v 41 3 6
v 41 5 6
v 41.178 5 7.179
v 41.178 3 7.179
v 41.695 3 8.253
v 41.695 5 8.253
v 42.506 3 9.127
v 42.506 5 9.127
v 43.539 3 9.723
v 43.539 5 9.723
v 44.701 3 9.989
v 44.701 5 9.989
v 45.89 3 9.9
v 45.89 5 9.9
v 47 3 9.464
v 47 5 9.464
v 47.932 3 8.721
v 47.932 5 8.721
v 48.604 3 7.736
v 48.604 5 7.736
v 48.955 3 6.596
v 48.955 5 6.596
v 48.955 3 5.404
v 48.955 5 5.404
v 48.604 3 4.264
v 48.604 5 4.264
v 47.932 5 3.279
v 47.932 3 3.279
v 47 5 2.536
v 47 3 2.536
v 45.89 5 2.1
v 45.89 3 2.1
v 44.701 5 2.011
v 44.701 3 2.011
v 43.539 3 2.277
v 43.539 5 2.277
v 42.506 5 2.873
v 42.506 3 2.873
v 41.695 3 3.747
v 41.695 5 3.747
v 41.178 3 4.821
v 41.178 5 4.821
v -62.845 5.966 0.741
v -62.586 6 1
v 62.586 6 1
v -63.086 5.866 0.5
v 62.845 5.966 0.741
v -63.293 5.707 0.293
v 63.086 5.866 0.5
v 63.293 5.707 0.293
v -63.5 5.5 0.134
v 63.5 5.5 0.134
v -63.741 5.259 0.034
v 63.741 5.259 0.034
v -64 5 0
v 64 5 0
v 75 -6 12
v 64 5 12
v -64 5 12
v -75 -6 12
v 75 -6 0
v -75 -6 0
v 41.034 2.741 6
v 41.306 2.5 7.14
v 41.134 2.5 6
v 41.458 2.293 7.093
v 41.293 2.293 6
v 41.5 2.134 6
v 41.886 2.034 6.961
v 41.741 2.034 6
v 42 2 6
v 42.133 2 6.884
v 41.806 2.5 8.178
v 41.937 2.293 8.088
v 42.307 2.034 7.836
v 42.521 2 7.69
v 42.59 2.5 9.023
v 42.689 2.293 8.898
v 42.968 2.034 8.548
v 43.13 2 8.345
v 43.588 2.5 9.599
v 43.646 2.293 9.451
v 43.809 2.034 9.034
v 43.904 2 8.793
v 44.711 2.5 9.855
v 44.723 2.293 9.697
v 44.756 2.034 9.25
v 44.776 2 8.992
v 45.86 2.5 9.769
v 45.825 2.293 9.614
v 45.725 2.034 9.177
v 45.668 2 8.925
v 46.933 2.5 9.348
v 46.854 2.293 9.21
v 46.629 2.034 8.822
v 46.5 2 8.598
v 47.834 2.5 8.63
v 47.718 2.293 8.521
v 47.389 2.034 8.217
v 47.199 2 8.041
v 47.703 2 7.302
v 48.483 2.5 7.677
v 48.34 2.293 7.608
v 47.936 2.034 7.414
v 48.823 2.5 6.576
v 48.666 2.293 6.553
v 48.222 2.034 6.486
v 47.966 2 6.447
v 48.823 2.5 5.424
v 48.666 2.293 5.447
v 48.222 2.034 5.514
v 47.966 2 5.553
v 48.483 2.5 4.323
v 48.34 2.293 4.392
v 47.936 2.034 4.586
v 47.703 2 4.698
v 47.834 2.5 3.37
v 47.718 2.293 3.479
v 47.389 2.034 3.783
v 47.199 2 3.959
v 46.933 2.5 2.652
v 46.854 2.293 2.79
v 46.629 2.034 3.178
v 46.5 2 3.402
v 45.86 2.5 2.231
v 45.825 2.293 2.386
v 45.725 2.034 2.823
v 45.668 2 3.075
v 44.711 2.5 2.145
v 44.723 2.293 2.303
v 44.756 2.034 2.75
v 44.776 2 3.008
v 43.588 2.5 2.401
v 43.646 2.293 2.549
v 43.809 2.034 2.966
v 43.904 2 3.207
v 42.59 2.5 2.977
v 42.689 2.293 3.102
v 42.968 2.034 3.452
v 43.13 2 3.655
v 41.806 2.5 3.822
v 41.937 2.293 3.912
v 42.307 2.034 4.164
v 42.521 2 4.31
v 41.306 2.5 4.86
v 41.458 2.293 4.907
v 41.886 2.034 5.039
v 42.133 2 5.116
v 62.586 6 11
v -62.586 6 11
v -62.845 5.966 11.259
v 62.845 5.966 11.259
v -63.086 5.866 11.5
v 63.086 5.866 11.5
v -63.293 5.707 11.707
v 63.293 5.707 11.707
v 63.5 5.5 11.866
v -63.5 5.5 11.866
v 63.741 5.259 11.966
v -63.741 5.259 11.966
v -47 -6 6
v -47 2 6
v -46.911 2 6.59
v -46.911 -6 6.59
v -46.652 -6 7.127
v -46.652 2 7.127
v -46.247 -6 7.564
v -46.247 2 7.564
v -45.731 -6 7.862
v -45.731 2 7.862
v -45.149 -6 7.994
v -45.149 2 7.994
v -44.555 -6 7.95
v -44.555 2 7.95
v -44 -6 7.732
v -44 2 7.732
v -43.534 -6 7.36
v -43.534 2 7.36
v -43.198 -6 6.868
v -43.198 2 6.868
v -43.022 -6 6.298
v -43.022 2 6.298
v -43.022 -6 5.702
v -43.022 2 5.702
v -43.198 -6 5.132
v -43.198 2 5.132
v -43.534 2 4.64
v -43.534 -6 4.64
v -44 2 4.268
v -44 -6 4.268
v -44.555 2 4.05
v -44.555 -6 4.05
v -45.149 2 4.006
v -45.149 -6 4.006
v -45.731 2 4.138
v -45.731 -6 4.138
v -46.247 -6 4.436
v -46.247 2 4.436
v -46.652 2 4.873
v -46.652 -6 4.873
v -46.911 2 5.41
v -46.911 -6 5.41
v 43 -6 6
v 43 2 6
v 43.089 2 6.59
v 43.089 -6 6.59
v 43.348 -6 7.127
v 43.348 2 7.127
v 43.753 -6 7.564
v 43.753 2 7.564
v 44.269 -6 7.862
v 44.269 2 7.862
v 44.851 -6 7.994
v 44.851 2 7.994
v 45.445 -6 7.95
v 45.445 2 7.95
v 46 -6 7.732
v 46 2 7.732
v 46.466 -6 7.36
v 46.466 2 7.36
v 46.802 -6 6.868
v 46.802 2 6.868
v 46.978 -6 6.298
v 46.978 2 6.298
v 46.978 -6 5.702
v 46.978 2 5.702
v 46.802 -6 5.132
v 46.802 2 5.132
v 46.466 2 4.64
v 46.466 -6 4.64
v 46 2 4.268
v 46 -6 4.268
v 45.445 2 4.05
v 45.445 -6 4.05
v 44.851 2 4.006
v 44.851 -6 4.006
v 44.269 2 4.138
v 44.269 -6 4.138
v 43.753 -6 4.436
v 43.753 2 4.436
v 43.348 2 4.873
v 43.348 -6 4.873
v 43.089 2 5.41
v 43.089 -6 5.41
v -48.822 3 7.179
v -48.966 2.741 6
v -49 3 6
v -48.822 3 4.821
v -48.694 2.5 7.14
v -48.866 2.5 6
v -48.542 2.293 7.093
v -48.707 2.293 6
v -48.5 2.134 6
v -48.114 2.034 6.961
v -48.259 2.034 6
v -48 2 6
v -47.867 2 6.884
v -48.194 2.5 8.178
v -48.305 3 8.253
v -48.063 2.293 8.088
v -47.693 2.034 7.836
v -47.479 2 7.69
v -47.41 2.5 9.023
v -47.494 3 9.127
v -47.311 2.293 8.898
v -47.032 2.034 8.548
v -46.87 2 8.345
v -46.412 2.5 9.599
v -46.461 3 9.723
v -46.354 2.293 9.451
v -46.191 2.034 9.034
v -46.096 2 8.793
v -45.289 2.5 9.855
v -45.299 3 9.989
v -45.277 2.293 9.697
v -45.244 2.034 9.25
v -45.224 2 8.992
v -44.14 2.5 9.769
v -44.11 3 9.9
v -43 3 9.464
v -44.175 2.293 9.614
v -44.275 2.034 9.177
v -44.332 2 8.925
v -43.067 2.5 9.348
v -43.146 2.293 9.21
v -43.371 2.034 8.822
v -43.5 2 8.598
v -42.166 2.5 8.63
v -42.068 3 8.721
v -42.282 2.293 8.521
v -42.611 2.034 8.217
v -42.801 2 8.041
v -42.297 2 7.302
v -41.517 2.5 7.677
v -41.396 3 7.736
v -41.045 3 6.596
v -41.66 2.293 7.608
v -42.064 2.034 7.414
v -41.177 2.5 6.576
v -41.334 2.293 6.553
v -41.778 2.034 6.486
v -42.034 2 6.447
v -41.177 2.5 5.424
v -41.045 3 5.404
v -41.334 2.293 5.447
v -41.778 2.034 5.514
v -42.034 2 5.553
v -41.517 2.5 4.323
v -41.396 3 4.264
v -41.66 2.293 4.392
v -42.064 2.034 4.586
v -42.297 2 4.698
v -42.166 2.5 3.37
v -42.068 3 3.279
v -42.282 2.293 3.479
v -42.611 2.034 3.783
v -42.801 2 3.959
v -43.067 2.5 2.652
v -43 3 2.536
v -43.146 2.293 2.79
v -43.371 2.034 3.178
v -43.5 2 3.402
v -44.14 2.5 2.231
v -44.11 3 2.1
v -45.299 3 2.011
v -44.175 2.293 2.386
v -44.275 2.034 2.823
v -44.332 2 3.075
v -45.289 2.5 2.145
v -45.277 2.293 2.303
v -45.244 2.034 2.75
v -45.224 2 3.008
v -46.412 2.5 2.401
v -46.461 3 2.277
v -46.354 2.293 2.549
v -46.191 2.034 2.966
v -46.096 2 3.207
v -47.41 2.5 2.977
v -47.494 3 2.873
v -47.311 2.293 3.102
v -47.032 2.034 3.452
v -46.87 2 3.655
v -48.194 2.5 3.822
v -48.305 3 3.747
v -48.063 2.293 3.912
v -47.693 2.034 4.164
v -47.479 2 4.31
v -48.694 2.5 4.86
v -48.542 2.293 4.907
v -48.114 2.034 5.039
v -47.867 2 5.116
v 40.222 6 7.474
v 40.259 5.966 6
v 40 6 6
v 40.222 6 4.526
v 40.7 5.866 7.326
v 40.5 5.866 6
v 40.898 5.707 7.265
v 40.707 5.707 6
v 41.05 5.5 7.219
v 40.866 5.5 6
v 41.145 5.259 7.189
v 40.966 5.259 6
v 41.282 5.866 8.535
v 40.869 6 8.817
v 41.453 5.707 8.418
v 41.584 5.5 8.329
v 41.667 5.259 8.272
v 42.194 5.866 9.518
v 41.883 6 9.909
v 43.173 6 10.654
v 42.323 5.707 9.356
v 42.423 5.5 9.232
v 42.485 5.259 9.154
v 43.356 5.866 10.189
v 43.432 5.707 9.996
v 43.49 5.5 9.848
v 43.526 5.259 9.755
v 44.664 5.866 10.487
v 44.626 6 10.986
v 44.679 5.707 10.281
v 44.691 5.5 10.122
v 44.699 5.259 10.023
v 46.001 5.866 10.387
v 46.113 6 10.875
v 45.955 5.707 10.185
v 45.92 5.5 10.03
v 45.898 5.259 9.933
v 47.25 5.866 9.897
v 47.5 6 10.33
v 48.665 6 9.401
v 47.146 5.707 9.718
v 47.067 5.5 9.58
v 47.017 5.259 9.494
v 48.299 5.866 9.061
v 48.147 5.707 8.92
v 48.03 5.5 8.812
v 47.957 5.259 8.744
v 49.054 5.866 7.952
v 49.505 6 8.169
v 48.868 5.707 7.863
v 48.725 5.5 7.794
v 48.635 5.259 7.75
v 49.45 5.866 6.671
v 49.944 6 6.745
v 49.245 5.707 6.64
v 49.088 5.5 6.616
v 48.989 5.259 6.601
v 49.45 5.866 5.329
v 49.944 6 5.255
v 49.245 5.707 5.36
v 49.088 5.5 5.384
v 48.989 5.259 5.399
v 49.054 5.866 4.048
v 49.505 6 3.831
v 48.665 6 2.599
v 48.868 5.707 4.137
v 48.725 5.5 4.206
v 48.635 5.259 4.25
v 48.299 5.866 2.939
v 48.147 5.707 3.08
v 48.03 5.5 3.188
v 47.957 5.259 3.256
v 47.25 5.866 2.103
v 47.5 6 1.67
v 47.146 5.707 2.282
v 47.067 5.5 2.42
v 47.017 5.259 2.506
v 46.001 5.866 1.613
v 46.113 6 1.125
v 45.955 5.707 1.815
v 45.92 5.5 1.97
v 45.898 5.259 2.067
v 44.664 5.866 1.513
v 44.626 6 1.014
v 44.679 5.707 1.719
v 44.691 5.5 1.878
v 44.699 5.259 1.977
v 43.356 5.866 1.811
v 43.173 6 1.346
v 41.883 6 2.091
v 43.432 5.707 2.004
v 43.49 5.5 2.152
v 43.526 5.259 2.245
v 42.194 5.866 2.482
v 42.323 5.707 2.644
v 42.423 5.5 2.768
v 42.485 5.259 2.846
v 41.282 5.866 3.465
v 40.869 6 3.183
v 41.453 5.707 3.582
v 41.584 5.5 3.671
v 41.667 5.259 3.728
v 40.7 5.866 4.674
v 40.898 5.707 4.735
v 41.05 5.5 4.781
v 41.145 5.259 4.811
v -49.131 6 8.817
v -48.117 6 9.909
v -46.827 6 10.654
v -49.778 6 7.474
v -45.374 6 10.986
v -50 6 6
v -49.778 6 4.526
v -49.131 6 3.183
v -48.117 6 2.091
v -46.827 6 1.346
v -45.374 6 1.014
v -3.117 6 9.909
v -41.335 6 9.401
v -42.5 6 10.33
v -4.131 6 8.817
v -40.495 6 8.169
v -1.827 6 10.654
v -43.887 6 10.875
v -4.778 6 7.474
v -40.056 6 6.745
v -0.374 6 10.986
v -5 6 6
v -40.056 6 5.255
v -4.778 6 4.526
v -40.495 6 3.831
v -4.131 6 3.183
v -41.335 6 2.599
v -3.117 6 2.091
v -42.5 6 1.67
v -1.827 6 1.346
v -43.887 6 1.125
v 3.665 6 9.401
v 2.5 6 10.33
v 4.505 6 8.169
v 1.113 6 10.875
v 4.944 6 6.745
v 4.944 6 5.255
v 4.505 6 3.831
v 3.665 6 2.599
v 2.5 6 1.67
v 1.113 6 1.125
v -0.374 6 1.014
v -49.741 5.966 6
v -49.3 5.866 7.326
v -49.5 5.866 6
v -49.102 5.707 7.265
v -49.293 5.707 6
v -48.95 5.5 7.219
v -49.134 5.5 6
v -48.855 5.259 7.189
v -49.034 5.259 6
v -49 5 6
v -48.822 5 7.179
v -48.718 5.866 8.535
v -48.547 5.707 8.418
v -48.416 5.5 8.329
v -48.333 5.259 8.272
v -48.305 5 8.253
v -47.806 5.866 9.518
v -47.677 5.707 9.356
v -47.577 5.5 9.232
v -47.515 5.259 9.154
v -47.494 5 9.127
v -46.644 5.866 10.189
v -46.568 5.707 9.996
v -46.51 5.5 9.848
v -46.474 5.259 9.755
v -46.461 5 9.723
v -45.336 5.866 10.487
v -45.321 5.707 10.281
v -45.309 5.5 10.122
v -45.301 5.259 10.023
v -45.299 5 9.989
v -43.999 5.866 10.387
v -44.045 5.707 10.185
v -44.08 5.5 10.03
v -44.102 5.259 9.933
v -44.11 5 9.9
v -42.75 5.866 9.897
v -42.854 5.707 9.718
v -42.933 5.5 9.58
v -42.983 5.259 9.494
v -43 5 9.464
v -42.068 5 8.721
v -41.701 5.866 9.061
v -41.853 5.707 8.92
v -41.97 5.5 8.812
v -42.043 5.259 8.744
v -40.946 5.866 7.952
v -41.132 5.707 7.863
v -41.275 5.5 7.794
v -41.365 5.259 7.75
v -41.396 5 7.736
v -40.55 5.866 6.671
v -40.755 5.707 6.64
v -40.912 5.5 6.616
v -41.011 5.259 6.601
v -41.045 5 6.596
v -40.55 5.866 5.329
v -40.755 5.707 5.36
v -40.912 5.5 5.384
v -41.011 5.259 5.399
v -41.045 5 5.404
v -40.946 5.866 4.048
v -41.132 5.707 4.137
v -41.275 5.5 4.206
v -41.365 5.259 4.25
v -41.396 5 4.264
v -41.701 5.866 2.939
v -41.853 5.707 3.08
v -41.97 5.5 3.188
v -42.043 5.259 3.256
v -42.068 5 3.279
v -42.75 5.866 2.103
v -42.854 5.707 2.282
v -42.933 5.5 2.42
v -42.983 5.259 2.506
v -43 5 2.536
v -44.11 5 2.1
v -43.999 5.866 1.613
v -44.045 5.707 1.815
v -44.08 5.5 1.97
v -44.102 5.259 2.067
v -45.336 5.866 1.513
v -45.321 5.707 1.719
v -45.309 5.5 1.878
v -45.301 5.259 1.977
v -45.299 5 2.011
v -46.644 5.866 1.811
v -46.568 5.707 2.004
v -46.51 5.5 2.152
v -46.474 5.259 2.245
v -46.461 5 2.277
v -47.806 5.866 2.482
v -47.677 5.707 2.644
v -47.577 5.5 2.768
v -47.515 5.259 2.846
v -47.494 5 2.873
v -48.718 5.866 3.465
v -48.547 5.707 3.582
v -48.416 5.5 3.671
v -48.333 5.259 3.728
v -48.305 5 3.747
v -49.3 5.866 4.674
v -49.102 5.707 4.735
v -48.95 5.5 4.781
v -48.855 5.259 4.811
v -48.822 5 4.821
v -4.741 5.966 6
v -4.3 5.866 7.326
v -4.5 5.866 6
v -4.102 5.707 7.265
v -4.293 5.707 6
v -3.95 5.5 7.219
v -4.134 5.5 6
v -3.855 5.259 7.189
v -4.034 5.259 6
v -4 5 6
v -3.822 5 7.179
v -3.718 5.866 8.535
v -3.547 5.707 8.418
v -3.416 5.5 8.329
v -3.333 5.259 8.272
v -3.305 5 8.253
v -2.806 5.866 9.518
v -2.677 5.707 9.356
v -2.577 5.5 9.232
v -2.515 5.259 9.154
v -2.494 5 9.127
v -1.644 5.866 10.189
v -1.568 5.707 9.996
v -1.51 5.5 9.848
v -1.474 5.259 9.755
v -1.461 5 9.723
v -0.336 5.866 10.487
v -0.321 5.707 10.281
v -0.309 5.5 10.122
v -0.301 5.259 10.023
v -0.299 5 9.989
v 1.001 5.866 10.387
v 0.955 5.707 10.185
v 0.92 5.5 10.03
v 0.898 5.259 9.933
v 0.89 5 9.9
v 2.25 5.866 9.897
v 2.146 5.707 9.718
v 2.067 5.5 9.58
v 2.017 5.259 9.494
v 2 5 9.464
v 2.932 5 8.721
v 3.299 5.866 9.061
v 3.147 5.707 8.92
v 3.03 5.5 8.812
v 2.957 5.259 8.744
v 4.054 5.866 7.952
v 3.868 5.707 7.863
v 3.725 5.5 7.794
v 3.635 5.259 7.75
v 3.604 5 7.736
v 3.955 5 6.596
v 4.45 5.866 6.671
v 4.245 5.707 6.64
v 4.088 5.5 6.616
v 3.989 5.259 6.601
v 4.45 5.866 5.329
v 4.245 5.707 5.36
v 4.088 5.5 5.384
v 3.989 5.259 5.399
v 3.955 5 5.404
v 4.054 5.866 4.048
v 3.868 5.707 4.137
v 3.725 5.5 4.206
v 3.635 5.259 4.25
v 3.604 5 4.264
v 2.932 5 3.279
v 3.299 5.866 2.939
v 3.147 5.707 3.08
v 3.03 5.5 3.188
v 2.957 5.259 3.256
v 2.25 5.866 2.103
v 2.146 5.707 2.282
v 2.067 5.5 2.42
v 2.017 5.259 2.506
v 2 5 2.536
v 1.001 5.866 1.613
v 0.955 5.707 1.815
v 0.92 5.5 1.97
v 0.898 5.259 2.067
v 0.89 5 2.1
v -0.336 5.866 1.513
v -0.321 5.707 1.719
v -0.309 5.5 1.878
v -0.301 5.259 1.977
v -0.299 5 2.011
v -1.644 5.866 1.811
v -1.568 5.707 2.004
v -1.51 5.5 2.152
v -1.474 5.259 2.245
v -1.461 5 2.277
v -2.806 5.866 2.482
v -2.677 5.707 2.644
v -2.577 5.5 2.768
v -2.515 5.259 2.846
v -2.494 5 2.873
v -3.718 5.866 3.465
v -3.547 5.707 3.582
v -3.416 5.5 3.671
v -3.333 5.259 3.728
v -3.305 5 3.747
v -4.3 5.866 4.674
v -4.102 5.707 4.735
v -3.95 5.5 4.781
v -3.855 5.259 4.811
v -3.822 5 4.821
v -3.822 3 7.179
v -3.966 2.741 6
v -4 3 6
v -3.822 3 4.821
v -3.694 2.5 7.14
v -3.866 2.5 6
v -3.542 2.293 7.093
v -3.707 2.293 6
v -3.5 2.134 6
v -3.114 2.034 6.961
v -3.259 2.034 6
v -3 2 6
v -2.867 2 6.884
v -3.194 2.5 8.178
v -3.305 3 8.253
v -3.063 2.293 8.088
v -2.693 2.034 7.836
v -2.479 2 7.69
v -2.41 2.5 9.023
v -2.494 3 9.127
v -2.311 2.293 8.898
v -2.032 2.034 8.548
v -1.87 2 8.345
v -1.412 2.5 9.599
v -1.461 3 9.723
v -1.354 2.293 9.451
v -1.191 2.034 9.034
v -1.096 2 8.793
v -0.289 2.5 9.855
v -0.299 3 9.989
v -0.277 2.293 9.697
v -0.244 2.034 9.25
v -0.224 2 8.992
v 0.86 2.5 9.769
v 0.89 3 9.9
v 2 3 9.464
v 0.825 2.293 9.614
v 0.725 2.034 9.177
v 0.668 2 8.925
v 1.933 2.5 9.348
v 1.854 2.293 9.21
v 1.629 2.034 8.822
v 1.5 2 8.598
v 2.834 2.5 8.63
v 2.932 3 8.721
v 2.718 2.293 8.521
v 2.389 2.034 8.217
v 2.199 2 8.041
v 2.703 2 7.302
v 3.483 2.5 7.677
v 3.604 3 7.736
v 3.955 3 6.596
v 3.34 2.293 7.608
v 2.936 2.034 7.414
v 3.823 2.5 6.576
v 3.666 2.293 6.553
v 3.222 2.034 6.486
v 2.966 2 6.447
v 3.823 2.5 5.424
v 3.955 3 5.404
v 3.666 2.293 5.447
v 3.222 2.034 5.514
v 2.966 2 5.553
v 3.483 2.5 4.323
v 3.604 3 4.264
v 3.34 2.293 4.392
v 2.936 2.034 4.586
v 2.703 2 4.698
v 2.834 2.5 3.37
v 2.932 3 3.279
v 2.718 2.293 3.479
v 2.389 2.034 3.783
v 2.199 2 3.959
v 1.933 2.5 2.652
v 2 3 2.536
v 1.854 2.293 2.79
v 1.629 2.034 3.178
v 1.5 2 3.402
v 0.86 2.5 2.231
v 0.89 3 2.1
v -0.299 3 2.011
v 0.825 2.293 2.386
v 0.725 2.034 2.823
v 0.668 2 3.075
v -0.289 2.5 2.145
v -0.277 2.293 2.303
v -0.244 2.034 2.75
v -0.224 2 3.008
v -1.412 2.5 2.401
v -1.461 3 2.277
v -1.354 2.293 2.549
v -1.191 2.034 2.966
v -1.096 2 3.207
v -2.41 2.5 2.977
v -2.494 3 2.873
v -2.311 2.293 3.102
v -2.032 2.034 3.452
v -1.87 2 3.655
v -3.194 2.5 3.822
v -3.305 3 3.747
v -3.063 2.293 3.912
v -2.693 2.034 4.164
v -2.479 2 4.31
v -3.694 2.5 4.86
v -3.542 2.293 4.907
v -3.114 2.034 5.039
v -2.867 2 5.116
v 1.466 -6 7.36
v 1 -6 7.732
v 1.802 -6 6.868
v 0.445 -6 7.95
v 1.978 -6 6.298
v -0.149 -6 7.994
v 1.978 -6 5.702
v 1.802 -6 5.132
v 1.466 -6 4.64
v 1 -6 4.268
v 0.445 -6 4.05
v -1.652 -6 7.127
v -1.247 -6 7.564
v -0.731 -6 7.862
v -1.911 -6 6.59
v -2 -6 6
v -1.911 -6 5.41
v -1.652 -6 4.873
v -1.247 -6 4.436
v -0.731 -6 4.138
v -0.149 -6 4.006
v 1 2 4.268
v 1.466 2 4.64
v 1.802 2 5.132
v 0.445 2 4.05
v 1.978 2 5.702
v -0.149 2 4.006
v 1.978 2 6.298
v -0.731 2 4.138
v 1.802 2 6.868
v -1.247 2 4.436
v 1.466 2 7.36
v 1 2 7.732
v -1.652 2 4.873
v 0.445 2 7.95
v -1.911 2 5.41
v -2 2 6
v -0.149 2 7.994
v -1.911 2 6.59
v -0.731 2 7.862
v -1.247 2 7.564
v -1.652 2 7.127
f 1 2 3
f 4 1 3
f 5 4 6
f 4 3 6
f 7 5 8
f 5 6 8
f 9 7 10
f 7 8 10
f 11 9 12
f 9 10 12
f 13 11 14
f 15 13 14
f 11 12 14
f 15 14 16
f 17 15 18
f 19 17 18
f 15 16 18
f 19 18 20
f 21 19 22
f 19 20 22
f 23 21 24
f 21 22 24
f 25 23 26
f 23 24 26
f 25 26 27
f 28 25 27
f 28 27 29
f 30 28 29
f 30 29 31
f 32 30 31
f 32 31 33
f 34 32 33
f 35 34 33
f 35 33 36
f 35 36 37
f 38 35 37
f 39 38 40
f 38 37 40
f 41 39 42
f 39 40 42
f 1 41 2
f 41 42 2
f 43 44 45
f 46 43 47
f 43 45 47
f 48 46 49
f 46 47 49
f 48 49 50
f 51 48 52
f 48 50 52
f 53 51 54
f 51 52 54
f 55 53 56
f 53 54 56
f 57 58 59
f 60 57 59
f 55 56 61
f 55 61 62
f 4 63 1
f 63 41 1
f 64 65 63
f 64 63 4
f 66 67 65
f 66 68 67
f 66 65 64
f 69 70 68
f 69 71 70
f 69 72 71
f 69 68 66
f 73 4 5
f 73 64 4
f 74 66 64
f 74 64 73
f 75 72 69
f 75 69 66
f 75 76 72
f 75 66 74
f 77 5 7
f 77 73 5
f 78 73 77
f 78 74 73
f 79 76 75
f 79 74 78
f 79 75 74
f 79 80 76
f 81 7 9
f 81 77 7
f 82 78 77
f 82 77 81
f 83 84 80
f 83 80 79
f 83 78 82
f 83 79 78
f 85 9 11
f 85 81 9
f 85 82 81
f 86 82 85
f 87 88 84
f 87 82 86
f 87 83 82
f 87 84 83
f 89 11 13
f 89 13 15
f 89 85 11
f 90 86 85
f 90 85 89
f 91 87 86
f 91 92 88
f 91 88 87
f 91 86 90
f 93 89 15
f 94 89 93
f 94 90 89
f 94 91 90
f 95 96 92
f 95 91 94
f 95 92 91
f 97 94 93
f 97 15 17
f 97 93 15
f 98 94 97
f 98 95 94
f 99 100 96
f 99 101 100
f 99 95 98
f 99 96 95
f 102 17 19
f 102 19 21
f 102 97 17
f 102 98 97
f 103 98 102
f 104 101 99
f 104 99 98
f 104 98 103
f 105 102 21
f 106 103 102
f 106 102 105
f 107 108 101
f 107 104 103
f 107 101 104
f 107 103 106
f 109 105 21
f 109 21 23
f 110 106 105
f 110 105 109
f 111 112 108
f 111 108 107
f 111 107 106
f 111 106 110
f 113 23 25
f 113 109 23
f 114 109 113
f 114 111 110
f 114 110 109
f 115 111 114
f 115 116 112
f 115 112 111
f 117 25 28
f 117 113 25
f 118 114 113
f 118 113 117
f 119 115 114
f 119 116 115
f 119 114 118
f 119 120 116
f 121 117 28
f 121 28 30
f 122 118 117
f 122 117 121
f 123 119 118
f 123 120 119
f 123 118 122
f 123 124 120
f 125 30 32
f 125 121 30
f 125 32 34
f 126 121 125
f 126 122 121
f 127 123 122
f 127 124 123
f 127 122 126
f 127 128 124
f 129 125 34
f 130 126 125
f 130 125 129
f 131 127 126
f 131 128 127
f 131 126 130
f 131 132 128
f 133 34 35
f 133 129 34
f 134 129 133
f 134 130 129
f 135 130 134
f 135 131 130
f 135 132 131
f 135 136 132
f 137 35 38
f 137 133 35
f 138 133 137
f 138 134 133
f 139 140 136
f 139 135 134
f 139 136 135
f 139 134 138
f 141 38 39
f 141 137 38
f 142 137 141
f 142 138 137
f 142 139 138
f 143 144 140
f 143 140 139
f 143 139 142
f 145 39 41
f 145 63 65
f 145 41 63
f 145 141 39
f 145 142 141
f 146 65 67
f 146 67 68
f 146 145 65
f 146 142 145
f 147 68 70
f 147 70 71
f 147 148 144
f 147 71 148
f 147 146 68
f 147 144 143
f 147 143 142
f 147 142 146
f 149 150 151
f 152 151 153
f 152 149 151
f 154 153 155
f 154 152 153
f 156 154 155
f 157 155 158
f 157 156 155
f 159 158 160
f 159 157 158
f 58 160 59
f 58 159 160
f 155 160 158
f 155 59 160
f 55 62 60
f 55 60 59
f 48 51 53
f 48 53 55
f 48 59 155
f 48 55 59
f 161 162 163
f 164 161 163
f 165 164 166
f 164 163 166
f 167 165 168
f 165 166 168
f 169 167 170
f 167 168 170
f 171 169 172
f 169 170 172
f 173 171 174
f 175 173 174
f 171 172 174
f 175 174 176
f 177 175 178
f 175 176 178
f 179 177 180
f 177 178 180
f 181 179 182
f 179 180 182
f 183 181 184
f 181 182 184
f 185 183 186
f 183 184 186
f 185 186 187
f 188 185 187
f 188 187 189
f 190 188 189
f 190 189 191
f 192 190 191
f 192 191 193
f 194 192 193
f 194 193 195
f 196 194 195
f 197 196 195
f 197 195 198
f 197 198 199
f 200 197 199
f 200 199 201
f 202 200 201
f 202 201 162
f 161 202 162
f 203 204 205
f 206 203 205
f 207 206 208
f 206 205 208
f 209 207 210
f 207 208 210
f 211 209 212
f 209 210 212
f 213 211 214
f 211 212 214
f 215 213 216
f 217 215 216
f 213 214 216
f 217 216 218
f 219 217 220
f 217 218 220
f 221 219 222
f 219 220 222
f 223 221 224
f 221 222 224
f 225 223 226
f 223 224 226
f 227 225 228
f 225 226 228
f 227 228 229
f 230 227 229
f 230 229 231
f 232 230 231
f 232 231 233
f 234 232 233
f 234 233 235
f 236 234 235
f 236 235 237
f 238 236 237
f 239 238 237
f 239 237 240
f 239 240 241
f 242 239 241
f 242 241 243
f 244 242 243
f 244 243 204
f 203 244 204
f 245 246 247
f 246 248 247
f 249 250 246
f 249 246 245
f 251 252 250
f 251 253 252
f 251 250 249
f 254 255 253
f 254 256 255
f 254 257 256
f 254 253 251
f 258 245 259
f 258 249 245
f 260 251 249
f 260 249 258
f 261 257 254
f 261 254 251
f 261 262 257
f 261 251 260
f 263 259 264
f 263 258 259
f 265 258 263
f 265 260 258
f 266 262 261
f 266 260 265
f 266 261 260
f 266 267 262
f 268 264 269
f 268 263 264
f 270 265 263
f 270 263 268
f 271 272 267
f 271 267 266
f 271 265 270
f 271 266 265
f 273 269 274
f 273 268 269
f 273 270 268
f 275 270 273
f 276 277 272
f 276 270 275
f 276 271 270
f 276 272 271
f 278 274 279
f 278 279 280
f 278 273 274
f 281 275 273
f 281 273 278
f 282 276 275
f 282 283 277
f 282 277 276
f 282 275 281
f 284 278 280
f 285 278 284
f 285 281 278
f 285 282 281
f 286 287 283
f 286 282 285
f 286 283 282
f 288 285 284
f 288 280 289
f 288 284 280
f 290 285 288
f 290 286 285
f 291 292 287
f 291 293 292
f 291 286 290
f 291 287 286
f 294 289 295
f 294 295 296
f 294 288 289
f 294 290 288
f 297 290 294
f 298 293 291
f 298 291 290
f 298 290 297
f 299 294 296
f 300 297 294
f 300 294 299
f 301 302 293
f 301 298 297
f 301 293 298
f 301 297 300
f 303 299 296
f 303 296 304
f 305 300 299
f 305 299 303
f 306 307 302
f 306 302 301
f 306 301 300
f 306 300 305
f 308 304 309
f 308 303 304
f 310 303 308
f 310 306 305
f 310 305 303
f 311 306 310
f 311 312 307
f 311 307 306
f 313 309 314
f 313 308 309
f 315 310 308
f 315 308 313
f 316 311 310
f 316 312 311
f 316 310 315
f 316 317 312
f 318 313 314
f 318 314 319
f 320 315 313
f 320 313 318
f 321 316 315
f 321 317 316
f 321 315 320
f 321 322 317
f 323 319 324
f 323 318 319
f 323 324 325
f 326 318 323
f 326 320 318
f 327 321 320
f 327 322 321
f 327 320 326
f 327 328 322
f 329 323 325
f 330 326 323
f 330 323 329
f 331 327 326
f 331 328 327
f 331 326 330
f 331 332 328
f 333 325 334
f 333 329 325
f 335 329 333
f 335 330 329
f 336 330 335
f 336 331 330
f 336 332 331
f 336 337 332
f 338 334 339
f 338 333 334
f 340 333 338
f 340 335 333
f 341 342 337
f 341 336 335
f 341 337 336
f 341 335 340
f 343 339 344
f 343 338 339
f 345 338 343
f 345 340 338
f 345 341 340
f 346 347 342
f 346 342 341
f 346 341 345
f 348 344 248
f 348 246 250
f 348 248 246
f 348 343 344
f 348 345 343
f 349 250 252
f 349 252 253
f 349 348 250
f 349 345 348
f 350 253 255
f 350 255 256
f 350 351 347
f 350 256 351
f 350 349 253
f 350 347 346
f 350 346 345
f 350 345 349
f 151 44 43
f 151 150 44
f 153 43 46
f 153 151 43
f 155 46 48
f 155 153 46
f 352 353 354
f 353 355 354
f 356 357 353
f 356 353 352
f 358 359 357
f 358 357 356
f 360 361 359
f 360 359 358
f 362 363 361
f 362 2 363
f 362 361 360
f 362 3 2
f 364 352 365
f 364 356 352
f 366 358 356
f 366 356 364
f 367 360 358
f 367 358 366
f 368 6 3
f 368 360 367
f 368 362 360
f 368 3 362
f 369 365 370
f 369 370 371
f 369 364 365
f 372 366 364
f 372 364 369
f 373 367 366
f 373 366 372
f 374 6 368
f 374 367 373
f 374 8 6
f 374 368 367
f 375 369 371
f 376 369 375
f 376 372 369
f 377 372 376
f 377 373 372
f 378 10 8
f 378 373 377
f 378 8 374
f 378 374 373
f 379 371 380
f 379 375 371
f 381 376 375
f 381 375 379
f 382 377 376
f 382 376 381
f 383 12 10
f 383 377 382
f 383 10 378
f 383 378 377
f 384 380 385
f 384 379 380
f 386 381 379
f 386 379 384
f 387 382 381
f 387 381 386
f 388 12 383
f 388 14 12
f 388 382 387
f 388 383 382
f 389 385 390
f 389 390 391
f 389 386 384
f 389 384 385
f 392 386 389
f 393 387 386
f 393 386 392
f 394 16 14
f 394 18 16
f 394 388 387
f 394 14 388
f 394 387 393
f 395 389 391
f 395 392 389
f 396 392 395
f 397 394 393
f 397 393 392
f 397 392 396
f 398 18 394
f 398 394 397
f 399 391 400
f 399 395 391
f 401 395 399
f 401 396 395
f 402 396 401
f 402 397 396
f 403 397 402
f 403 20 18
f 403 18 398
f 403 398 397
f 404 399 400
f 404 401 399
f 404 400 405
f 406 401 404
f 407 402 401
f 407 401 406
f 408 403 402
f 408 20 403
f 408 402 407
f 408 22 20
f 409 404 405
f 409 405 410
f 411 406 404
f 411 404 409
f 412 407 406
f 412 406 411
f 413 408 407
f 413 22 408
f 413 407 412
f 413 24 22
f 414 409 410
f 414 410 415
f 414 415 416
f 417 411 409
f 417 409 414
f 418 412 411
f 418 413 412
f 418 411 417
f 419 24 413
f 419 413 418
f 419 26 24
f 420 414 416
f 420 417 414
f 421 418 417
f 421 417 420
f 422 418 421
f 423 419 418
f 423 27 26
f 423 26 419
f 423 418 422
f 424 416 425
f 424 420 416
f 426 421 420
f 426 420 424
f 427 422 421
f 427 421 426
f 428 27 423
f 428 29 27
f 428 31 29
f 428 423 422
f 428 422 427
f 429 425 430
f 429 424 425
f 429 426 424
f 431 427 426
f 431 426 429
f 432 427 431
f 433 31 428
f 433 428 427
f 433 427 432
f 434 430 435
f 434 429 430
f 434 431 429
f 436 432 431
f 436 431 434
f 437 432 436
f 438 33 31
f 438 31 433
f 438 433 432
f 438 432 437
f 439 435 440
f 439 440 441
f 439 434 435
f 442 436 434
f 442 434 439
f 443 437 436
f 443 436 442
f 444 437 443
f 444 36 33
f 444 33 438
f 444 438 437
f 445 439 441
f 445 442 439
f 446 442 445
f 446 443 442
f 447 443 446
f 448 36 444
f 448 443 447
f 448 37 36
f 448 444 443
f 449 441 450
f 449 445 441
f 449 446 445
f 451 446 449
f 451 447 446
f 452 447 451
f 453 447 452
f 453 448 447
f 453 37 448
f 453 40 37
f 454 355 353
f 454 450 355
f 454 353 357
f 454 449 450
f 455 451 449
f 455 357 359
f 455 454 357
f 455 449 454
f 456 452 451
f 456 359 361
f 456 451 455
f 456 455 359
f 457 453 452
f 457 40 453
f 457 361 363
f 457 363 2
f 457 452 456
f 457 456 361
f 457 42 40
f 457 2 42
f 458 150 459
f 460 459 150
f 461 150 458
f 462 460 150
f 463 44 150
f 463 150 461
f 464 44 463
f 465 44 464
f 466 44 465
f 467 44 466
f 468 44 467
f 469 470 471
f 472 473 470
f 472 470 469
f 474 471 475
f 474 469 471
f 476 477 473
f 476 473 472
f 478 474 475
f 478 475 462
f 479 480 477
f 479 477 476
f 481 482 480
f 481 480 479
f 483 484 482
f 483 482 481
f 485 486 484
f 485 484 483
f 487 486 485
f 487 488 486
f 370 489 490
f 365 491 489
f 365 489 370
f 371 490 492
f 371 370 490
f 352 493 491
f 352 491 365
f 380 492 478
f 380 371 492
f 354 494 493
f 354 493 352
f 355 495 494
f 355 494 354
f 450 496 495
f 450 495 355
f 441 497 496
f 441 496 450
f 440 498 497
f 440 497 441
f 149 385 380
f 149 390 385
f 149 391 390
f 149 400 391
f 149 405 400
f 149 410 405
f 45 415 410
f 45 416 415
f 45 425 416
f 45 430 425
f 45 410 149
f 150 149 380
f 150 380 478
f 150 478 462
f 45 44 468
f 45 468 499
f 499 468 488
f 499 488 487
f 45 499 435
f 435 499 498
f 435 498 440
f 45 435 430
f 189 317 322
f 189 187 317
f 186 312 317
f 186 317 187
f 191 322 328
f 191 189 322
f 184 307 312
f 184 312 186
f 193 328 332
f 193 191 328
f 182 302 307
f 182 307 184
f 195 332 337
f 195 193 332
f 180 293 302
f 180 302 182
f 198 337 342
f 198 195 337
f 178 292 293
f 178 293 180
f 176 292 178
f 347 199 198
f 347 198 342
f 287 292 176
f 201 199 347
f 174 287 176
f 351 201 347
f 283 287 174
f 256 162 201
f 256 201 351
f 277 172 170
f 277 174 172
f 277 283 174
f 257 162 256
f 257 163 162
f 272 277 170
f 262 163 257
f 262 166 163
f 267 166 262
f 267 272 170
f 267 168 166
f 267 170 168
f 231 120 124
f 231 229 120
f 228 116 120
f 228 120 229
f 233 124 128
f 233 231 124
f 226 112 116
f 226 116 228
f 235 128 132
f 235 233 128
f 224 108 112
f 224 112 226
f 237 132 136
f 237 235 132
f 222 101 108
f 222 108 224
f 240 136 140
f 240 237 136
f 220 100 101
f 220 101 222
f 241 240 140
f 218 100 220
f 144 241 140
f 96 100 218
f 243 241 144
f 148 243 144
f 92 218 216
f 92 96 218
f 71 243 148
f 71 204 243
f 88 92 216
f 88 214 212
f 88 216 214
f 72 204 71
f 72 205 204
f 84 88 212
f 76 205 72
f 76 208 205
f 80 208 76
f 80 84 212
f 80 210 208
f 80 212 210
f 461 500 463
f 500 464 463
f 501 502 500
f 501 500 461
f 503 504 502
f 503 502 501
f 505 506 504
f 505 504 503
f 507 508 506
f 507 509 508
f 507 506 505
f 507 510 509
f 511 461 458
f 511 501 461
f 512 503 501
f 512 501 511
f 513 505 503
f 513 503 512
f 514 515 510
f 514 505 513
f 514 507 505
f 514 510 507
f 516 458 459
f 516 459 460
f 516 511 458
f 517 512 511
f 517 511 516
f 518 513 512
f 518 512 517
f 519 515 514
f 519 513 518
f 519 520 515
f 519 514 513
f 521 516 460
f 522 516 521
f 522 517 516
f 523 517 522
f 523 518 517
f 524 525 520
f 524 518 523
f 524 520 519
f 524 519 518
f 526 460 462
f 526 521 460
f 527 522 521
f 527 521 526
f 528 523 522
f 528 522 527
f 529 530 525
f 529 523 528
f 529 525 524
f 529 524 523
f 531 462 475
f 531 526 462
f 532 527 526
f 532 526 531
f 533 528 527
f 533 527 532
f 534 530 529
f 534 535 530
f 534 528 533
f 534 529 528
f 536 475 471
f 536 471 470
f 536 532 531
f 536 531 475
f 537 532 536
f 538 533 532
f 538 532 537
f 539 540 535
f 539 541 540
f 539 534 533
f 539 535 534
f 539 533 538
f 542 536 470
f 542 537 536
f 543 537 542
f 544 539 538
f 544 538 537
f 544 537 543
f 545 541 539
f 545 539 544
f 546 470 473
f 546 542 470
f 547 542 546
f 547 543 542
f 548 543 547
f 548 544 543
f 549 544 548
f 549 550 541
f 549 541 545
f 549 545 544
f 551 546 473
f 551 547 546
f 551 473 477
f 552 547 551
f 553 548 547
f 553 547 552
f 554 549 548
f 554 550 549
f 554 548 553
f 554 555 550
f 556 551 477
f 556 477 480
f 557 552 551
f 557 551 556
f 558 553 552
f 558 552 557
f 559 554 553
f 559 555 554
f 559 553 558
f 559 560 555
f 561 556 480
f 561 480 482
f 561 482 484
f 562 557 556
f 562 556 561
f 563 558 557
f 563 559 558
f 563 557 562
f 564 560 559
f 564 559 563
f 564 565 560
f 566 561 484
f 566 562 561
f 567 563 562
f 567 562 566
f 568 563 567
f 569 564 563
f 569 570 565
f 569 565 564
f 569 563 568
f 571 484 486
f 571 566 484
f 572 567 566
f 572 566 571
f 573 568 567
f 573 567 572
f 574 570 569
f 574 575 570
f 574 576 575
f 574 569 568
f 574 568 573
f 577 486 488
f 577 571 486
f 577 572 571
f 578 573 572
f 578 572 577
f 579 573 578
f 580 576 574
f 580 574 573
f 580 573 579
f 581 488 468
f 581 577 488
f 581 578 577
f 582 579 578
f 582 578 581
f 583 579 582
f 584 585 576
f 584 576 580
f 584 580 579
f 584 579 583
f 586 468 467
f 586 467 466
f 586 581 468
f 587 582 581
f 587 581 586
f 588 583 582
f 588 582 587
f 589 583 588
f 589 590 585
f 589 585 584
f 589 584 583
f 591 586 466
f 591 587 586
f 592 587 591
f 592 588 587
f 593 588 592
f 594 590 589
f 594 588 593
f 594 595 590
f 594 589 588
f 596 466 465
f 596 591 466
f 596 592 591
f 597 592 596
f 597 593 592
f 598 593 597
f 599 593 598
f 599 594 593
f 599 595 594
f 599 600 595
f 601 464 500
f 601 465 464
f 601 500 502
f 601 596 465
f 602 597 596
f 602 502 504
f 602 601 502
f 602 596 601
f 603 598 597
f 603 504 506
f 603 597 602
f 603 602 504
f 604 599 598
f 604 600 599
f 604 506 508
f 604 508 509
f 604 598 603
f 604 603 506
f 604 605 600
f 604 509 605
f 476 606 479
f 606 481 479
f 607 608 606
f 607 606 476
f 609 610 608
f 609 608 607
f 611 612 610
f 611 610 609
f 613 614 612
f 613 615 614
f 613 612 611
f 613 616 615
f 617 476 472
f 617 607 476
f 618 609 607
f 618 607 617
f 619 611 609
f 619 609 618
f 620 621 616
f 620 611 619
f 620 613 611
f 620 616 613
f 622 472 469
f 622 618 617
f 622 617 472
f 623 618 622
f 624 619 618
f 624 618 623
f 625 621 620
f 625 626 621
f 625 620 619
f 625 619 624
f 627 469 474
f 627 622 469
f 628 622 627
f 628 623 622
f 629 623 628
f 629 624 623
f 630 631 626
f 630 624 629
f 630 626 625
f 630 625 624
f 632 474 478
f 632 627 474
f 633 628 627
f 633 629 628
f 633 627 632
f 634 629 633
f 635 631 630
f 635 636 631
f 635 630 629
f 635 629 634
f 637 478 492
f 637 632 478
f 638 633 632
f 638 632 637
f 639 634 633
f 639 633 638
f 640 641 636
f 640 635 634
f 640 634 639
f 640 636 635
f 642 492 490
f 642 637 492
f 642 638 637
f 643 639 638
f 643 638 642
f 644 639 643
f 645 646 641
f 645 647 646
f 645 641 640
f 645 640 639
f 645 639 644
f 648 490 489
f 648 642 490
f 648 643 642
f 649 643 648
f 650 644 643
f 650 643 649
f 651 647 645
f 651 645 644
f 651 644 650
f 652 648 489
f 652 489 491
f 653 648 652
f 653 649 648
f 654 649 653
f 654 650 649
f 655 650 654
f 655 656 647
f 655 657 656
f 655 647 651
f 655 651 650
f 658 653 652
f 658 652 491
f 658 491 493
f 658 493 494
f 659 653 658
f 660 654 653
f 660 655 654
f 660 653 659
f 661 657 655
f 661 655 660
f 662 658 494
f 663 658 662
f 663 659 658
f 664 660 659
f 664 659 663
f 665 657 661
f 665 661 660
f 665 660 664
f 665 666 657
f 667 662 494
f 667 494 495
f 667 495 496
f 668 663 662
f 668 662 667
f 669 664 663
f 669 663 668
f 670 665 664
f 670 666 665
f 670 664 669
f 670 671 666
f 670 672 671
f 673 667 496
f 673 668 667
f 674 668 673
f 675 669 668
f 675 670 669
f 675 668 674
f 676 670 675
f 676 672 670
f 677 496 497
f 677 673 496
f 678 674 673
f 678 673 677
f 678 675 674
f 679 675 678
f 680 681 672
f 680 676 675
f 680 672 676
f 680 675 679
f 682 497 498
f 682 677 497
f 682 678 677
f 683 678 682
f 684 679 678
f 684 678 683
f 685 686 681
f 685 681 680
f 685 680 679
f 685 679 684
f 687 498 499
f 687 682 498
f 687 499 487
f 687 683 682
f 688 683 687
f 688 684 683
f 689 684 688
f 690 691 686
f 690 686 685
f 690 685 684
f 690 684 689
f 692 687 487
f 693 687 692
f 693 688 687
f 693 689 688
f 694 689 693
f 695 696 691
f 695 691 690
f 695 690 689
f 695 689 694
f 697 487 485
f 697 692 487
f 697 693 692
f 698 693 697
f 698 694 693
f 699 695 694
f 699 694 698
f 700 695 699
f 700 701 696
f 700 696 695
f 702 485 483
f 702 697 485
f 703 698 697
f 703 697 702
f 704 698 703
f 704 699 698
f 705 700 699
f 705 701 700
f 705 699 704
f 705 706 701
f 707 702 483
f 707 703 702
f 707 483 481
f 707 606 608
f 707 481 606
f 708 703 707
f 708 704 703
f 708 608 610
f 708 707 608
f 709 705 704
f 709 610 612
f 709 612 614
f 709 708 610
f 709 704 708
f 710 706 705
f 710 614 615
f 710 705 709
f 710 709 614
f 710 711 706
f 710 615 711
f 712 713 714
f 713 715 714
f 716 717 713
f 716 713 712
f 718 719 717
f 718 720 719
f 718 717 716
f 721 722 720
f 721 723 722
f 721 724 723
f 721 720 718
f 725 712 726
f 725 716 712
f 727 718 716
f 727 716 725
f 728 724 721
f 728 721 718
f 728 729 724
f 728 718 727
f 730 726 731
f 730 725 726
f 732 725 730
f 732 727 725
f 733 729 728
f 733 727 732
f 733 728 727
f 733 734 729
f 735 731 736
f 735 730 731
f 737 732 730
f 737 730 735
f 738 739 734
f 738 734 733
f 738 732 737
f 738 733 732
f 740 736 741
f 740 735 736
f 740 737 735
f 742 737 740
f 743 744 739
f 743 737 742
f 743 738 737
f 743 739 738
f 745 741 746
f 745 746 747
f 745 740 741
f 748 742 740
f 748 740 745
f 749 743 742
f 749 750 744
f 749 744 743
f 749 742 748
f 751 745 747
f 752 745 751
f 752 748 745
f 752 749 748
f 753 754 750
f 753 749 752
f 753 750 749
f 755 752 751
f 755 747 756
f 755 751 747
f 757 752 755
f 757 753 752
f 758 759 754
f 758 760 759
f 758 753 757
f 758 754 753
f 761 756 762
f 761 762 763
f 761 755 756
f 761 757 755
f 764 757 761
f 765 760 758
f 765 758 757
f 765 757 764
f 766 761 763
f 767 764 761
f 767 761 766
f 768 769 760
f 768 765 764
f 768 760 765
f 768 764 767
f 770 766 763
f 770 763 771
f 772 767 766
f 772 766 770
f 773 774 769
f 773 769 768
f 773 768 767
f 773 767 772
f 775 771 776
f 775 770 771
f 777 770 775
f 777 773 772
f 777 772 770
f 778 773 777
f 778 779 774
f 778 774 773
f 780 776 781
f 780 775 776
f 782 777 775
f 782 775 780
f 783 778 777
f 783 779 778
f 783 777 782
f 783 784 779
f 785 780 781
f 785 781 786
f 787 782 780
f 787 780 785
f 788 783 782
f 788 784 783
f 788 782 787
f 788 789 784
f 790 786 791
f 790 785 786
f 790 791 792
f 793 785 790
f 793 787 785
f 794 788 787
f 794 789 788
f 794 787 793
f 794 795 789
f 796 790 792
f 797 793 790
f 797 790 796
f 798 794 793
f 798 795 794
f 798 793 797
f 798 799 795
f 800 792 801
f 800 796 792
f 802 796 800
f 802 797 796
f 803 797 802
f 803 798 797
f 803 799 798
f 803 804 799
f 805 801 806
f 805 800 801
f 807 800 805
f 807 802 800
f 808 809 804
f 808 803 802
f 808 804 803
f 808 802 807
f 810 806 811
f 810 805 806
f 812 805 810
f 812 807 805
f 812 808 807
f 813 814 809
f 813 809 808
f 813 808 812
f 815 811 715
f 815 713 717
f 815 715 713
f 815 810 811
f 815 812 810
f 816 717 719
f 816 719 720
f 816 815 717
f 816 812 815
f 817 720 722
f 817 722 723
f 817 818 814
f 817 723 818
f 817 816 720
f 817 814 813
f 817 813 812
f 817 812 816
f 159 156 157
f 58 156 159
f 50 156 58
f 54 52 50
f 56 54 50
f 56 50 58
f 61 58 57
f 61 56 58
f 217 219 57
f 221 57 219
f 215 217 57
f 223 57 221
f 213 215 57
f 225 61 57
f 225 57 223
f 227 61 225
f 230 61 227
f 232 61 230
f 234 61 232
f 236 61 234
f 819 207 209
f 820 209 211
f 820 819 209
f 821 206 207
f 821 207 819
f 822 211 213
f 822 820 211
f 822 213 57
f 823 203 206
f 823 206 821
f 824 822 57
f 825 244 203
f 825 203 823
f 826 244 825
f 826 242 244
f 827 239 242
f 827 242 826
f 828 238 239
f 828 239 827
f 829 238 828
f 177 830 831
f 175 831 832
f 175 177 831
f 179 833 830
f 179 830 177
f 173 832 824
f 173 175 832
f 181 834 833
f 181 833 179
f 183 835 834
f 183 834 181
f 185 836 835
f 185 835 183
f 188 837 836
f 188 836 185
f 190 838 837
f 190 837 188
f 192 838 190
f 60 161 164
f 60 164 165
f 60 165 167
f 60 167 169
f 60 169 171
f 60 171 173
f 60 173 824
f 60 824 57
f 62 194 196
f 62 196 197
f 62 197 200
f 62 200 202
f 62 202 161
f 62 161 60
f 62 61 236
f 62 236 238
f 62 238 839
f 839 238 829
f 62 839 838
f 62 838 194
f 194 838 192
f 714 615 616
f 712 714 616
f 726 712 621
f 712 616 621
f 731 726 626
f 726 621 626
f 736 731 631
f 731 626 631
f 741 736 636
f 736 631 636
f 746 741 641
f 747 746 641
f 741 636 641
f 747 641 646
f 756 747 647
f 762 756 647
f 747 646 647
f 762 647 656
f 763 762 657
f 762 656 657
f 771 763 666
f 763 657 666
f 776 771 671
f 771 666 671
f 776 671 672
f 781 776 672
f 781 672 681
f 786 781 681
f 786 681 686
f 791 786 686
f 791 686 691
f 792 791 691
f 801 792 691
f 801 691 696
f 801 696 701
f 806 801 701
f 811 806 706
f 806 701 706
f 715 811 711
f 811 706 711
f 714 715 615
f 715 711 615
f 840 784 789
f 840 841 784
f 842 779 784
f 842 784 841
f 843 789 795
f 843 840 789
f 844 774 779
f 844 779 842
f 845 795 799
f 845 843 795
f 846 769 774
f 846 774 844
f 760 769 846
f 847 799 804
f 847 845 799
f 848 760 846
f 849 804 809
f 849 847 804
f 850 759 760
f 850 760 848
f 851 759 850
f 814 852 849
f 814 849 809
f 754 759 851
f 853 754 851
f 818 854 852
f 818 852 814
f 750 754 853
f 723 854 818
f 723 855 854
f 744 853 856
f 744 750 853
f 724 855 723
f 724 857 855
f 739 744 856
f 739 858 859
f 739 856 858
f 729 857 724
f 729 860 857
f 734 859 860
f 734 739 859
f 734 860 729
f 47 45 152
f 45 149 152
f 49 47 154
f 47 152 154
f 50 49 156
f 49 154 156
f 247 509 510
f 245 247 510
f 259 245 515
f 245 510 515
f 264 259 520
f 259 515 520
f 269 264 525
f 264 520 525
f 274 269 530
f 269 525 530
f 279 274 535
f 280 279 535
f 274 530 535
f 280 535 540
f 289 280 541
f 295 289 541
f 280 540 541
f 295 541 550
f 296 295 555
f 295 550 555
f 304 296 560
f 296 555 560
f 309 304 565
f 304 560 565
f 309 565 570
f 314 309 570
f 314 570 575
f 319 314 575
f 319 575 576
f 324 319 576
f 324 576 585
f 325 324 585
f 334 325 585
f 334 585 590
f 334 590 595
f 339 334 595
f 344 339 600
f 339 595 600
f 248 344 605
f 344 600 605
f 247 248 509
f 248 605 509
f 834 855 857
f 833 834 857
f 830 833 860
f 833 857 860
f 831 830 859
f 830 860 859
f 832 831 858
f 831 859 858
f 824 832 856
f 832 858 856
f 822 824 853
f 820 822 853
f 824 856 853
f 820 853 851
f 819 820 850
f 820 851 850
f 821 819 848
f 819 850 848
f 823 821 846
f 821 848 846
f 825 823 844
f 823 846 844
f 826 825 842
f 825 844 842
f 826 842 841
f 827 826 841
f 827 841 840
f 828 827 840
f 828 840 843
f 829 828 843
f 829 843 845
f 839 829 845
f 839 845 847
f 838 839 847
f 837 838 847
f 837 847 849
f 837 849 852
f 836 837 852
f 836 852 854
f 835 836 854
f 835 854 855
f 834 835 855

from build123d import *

# Parameters (mm, degrees)
BOSS_EXTRUDE1_DEPTH = 12
SKETCH3_R           = 2
CUT_EXTRUDE1_DEPTH  = 12
SKETCH4_R           = 4
CUT_EXTRUDE2_DEPTH  = 4
FILLET1_R           = 1
FILLET2_R           = 1
FILLET3_R           = 1


with BuildPart() as part:
    # Sketch2 → Boss-Extrude1 (new body)
    with BuildSketch(Plane.XY):
        Polygon((-75, -6), (-63, 6), (63, 6), (75, -6), align=None)
    extrude(amount=BOSS_EXTRUDE1_DEPTH)

    # Sketch3 → Cut-Extrude1 (cut)
    with BuildSketch(Plane(origin=(0, 6, 0), x_dir=(1, 0, 0), z_dir=(0, 1, 0))):
        with Locations(Location((0, -6, 0), (0, 0, 180))):
            Circle(SKETCH3_R)
        with Locations(Location((45, -6, 0), (0, 0, 180))):
            Circle(SKETCH3_R)
        with Locations(Location((-45, -6, 0), (0, 0, 180))):
            Circle(SKETCH3_R)
    extrude(amount=-CUT_EXTRUDE1_DEPTH, mode=Mode.SUBTRACT)

    # Sketch4 → Cut-Extrude2 (cut)
    with BuildSketch(Plane(origin=(0, 6, 0), x_dir=(1, 0, 0), z_dir=(0, 1, 0))):
        with Locations(Location((-45, -6, 0), (0, 0, 180))):
            Circle(SKETCH4_R)
        with Locations(Location((0, -6, 0), (0, 0, 180))):
            Circle(SKETCH4_R)
        with Locations(Location((45, -6, 0), (0, 0, 180))):
            Circle(SKETCH4_R)
    extrude(amount=-CUT_EXTRUDE2_DEPTH, mode=Mode.SUBTRACT)

    # Fillet1
    fillet1_edges = [part.edges().sort_by_distance(p)[0] for p in [
        (-41, 6, 6),
        (4, 6, 6),
        (49, 6, 6),
    ]]
    fillet(fillet1_edges, radius=FILLET1_R)

    # Fillet2
    fillet2_edges = [part.edges().sort_by_distance(p)[0] for p in [
        (-41, 2, 6),
        (4, 2, 6),
        (49, 2, 6),
    ]]
    fillet(fillet2_edges, radius=FILLET2_R)

    # Fillet3
    fillet3_edges = [part.edges().sort_by_distance(p)[0] for p in [
        (0, 6, 12),
        (0, 6, 0),
        (-63, 6, 6),
        (63, 6, 6),
    ]]
    fillet(fillet3_edges, radius=FILLET3_R - 0.0001)  # a hair under: the kernel refuses the full size


solid = part.part
